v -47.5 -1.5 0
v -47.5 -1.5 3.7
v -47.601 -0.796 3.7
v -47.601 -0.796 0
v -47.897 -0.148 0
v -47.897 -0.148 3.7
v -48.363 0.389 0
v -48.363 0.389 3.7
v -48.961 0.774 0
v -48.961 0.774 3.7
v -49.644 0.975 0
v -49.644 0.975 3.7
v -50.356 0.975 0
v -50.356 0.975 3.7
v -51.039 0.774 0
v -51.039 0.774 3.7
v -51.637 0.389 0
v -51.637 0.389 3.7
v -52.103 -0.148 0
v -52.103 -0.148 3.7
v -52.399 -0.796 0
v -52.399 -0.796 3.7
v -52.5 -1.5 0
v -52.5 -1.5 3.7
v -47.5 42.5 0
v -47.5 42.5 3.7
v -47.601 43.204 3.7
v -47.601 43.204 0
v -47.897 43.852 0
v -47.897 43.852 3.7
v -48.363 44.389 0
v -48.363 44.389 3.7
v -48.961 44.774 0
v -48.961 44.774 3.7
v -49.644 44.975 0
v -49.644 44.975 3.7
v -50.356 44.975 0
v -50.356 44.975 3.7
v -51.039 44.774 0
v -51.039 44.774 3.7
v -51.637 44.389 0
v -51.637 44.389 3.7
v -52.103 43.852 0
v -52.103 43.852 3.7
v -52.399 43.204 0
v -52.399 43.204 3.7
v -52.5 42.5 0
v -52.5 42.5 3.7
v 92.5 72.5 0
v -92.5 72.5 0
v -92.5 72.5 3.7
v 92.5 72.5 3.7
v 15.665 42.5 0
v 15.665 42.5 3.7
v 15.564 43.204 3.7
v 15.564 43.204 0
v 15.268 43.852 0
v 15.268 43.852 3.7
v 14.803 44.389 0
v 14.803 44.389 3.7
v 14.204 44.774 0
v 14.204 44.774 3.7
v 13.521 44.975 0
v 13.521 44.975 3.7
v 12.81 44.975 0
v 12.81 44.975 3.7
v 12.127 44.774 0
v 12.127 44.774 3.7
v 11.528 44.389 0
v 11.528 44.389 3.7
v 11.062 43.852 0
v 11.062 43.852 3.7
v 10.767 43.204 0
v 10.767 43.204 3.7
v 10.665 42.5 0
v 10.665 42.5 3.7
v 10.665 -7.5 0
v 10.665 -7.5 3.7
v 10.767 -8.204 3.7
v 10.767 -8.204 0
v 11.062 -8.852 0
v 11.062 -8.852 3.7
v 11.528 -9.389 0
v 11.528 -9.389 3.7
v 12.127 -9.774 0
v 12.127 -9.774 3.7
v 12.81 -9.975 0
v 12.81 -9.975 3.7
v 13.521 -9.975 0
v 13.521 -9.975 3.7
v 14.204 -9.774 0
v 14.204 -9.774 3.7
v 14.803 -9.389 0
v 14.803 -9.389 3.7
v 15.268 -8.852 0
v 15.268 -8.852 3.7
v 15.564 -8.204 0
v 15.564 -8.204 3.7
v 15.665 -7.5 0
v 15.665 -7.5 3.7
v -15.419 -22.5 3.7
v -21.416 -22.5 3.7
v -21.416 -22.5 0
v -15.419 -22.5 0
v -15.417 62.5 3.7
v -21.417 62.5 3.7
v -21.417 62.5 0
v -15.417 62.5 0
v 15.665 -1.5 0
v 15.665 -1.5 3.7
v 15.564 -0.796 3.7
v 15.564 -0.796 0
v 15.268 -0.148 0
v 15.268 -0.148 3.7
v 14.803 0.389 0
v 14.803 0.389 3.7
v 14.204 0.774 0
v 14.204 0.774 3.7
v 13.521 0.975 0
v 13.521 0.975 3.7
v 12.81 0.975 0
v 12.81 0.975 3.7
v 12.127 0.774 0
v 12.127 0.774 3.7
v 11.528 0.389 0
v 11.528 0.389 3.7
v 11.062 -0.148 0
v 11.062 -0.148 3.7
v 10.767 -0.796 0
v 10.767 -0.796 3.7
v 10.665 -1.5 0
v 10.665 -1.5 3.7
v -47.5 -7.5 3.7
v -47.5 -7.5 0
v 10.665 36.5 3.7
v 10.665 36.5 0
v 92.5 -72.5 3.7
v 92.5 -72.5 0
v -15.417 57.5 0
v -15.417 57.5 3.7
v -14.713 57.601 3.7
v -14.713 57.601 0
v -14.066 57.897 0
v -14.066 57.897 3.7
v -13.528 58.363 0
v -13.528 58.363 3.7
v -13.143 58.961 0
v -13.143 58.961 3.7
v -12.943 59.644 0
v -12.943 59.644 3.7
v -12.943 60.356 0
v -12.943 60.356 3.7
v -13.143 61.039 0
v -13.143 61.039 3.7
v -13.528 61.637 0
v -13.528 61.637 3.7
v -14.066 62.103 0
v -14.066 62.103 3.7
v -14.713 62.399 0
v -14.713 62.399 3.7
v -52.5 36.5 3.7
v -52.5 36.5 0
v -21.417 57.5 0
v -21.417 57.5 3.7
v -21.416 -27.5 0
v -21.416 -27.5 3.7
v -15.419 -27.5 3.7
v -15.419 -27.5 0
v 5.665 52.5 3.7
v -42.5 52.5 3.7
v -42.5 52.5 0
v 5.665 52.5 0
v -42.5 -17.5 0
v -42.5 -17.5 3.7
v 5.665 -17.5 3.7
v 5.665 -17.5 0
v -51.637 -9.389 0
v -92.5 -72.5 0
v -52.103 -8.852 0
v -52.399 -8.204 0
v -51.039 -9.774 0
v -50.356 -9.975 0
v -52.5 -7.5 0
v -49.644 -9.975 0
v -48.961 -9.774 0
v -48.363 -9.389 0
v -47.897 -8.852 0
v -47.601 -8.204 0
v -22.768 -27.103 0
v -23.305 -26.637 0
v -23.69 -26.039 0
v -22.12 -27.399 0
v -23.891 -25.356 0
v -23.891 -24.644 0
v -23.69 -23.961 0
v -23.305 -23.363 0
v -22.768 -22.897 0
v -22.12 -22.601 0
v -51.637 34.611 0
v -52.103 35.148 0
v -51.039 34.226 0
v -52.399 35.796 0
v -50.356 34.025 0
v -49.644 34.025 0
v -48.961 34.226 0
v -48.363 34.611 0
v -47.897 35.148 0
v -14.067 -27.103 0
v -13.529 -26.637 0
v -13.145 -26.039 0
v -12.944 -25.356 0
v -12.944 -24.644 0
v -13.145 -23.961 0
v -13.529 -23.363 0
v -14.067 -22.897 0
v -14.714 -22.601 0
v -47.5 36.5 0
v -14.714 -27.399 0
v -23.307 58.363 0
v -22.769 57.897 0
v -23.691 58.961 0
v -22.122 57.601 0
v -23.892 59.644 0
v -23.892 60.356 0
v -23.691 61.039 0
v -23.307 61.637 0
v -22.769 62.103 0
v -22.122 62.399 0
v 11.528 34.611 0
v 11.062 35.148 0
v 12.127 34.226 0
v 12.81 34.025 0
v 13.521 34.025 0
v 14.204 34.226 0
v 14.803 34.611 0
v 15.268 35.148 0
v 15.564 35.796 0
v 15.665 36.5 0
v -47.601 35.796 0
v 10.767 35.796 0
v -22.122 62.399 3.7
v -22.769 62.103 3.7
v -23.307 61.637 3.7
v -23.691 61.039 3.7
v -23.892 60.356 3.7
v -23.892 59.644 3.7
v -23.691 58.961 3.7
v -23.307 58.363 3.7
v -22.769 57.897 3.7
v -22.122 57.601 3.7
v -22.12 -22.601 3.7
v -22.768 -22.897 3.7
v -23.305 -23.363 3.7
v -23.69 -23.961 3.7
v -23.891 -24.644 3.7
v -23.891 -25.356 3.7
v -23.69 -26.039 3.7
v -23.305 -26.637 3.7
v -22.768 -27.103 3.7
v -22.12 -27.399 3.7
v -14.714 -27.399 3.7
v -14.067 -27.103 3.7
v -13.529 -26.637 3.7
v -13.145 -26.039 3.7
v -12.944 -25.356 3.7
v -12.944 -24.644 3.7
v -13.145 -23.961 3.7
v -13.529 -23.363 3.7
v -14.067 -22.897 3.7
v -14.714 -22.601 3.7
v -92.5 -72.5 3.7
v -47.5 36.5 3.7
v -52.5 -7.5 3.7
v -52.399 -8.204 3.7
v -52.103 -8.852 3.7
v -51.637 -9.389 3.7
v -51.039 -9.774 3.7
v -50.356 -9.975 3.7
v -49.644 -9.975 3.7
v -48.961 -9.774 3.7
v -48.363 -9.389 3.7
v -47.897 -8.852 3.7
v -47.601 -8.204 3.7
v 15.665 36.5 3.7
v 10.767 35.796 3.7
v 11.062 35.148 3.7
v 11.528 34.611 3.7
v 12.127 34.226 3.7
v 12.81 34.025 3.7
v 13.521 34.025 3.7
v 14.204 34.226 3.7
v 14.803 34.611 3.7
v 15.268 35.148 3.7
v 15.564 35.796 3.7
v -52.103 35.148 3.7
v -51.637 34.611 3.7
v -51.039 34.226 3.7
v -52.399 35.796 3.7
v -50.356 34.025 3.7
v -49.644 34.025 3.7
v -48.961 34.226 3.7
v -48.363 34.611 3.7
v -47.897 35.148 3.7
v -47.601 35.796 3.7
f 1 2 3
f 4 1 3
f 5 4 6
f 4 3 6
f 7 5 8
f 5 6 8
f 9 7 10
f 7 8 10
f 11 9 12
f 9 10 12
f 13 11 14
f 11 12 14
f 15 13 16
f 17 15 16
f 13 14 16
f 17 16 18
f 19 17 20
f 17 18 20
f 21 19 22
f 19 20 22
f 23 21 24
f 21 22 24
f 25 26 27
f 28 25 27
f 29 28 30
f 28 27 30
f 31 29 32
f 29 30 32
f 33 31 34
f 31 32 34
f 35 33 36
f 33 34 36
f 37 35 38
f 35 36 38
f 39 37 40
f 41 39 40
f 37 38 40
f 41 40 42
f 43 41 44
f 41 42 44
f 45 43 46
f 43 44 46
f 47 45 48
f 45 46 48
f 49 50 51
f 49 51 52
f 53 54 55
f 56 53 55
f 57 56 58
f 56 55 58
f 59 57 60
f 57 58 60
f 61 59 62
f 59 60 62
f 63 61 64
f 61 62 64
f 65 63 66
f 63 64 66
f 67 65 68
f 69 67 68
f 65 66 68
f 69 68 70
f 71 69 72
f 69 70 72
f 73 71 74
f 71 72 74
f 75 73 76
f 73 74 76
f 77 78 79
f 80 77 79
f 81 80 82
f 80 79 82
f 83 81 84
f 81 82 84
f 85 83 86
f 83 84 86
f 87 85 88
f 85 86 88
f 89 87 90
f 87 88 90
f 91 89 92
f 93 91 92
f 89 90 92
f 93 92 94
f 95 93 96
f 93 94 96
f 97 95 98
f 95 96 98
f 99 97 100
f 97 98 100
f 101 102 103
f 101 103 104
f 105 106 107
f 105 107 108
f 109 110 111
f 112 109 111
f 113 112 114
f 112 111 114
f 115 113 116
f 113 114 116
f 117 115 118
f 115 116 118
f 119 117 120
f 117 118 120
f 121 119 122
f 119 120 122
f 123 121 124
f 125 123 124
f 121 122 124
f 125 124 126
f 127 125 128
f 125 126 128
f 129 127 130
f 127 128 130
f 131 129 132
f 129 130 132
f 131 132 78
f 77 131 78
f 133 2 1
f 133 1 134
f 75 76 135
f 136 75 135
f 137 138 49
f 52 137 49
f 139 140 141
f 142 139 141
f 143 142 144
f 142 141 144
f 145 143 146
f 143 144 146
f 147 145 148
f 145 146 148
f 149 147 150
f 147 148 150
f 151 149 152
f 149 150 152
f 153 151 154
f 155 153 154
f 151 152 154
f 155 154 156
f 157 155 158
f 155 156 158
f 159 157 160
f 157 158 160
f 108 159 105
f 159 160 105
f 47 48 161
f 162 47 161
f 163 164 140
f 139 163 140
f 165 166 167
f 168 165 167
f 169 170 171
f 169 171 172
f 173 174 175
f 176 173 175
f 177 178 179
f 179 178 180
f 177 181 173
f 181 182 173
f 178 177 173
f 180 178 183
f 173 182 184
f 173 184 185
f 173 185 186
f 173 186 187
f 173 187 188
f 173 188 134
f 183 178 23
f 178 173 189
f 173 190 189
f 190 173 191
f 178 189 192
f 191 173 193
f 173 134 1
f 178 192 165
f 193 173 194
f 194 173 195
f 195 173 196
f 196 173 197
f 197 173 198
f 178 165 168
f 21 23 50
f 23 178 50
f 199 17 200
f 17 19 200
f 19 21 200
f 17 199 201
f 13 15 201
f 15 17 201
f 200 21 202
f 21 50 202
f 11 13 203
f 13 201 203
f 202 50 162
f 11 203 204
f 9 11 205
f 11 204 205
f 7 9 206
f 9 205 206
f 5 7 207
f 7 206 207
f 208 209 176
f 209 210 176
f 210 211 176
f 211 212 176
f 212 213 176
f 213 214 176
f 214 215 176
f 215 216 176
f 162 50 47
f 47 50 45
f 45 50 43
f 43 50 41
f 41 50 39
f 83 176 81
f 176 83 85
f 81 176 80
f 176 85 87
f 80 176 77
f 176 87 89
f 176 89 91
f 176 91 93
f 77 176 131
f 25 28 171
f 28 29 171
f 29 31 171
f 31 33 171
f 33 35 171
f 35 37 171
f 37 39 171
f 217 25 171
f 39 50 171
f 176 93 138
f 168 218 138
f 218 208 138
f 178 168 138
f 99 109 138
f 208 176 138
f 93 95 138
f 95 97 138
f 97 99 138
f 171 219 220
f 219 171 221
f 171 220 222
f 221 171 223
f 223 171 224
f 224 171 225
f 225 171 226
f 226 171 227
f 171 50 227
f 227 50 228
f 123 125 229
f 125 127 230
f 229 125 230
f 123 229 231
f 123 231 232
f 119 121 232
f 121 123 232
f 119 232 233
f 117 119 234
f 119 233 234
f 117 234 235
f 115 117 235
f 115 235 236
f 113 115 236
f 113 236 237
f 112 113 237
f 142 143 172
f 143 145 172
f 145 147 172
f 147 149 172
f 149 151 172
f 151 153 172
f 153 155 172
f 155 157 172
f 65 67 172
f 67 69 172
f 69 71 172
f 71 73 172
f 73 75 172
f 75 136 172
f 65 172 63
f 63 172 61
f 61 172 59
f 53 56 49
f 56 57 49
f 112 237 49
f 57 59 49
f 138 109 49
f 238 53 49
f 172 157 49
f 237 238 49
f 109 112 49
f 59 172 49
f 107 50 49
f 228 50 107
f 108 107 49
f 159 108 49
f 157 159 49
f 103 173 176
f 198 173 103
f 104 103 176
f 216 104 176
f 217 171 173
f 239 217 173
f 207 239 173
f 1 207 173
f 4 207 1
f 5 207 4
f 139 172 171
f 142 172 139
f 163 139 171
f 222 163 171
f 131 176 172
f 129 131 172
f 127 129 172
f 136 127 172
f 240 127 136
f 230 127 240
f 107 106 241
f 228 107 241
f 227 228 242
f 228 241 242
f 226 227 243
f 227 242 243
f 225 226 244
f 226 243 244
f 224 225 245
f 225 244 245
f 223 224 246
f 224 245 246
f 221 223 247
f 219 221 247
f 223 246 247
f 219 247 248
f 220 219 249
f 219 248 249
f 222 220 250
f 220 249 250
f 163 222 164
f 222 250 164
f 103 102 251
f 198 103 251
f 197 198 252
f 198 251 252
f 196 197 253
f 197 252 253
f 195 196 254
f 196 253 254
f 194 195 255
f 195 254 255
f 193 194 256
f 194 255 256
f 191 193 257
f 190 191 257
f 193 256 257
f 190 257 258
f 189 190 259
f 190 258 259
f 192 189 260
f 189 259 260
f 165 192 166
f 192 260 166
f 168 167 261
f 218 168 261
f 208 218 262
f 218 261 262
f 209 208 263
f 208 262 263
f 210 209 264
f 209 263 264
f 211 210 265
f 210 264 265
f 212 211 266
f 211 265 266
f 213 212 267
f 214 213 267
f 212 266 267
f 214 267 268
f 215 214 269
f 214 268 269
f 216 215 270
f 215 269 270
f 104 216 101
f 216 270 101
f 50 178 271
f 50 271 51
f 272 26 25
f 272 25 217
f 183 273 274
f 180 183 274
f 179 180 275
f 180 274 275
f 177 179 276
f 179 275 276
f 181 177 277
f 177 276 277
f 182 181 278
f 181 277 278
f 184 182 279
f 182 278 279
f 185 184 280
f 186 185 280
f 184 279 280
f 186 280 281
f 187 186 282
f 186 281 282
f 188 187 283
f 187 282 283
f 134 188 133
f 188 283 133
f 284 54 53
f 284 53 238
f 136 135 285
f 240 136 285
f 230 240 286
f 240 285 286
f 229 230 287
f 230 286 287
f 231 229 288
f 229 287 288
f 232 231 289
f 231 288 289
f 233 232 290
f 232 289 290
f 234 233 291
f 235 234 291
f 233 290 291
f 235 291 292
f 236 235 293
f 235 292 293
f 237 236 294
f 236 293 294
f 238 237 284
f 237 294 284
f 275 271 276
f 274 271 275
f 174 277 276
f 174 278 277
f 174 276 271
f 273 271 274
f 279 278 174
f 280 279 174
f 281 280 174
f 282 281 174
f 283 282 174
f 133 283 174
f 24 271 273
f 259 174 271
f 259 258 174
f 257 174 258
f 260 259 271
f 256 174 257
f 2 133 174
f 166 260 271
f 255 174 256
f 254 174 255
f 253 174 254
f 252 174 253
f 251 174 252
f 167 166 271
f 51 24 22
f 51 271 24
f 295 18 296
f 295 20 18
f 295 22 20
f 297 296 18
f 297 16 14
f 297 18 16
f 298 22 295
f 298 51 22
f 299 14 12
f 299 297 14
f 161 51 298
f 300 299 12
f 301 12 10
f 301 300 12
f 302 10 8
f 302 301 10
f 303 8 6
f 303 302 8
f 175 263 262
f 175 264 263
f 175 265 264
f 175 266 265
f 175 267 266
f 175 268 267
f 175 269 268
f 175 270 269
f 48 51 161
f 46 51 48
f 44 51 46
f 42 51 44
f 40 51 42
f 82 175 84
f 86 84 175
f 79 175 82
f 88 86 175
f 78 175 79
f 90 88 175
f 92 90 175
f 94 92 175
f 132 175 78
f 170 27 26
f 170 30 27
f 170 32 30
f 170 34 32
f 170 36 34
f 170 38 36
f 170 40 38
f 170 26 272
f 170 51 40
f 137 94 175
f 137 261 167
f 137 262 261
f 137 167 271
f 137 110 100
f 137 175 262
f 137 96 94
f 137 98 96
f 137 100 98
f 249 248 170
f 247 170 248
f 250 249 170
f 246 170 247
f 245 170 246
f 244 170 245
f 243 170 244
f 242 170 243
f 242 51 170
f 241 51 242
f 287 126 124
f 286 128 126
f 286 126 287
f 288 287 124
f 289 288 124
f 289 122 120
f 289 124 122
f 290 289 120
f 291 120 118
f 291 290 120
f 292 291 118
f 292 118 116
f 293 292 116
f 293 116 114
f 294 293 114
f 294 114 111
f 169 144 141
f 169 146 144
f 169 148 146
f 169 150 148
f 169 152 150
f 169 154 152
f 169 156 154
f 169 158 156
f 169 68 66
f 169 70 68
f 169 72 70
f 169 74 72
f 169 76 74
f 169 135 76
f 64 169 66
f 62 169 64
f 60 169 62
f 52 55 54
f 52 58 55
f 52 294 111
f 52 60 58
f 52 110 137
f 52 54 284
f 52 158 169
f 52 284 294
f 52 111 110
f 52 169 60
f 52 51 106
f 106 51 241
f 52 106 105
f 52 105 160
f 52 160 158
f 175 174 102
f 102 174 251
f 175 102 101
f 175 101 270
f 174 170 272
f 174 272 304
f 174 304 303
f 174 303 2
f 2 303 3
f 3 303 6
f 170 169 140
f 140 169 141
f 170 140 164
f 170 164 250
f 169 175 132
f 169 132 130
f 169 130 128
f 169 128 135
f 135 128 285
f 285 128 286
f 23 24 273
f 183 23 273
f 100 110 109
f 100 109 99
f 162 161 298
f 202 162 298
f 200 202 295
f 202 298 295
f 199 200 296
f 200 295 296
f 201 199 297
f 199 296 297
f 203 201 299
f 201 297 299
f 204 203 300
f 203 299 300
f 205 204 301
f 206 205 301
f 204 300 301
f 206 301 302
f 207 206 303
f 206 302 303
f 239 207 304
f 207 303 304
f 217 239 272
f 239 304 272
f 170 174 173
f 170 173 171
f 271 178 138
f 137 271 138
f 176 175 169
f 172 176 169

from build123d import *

# Parameters (mm, degrees)
SKETCH_W        = 185
SKETCH_H        = 145
PAD_DEPTH       = 3.7
SKETCH001_W     = 48.165349
SKETCH001_H     = 70
POCKET_DEPTH    = 5
POCKET001_DEPTH = 5


with BuildPart() as part:
    # Sketch → Pad (new body)
    with BuildSketch(Plane.XY):
        Rectangle(SKETCH_W, SKETCH_H)
    extrude(amount=PAD_DEPTH)

    # Sketch001 (on Face6 of Pad) → Pocket (cut)
    with BuildSketch(Plane.XY.offset(3.7)):
        with Locations((-18.417326, 17.5)):
            Rectangle(SKETCH001_W, SKETCH001_H)
    extrude(amount=-POCKET_DEPTH, mode=Mode.SUBTRACT)

    # Sketch003 (on Face5 of Pocket) → Pocket001 (cut)
    with BuildSketch(Plane.XY.offset(3.7)):
        with BuildLine():
            ThreePointArc((-21.417326, 62.5), (-23.917326, 60), (-21.417326, 57.5))
            Line((-21.417326, 57.5), (-15.417326, 57.5))
            ThreePointArc((-15.417326, 57.5), (-12.917326, 60), (-15.417326, 62.5))
            Line((-21.417326, 62.5), (-15.417326, 62.5))
        make_face()
        with BuildLine():
            Line((-21.416062, -22.5), (-15.418589, -22.5))
            ThreePointArc((-15.418589, -27.5), (-12.918589, -25), (-15.418589, -22.5))
            Line((-21.416062, -27.5), (-15.418589, -27.5))
            ThreePointArc((-21.416062, -22.5), (-23.916062, -25), (-21.416062, -27.5))
        make_face()
        with BuildLine():
            ThreePointArc((-47.5, 42.5), (-50, 45), (-52.5, 42.5))
            Line((-52.5, 42.5), (-52.5, 36.5))
            ThreePointArc((-52.5, 36.5), (-50, 34), (-47.5, 36.5))
            Line((-47.5, 42.5), (-47.5, 36.5))
        make_face()
        with BuildLine():
            ThreePointArc((15.665349, 42.5), (13.165349, 45), (10.665349, 42.5))
            Line((10.665349, 42.5), (10.665349, 36.5))
            ThreePointArc((10.665349, 36.5), (13.165349, 34), (15.665349, 36.5))
            Line((15.665349, 42.5), (15.665349, 36.5))
        make_face()
        with BuildLine():
            ThreePointArc((-47.5, -1.5), (-50, 1), (-52.5, -1.5))
            Line((-52.5, -1.5), (-52.5, -7.5))
            ThreePointArc((-52.5, -7.5), (-50, -10), (-47.5, -7.5))
            Line((-47.5, -1.5), (-47.5, -7.5))
        make_face()
        with BuildLine():
            ThreePointArc((15.665349, -1.5), (13.165349, 1), (10.665349, -1.5))
            Line((10.665349, -1.5), (10.665349, -7.5))
            ThreePointArc((10.665349, -7.5), (13.165349, -10), (15.665349, -7.5))
            Line((15.665349, -1.5), (15.665349, -7.5))
        make_face()
    extrude(amount=-POCKET001_DEPTH, mode=Mode.SUBTRACT)


solid = part.part
